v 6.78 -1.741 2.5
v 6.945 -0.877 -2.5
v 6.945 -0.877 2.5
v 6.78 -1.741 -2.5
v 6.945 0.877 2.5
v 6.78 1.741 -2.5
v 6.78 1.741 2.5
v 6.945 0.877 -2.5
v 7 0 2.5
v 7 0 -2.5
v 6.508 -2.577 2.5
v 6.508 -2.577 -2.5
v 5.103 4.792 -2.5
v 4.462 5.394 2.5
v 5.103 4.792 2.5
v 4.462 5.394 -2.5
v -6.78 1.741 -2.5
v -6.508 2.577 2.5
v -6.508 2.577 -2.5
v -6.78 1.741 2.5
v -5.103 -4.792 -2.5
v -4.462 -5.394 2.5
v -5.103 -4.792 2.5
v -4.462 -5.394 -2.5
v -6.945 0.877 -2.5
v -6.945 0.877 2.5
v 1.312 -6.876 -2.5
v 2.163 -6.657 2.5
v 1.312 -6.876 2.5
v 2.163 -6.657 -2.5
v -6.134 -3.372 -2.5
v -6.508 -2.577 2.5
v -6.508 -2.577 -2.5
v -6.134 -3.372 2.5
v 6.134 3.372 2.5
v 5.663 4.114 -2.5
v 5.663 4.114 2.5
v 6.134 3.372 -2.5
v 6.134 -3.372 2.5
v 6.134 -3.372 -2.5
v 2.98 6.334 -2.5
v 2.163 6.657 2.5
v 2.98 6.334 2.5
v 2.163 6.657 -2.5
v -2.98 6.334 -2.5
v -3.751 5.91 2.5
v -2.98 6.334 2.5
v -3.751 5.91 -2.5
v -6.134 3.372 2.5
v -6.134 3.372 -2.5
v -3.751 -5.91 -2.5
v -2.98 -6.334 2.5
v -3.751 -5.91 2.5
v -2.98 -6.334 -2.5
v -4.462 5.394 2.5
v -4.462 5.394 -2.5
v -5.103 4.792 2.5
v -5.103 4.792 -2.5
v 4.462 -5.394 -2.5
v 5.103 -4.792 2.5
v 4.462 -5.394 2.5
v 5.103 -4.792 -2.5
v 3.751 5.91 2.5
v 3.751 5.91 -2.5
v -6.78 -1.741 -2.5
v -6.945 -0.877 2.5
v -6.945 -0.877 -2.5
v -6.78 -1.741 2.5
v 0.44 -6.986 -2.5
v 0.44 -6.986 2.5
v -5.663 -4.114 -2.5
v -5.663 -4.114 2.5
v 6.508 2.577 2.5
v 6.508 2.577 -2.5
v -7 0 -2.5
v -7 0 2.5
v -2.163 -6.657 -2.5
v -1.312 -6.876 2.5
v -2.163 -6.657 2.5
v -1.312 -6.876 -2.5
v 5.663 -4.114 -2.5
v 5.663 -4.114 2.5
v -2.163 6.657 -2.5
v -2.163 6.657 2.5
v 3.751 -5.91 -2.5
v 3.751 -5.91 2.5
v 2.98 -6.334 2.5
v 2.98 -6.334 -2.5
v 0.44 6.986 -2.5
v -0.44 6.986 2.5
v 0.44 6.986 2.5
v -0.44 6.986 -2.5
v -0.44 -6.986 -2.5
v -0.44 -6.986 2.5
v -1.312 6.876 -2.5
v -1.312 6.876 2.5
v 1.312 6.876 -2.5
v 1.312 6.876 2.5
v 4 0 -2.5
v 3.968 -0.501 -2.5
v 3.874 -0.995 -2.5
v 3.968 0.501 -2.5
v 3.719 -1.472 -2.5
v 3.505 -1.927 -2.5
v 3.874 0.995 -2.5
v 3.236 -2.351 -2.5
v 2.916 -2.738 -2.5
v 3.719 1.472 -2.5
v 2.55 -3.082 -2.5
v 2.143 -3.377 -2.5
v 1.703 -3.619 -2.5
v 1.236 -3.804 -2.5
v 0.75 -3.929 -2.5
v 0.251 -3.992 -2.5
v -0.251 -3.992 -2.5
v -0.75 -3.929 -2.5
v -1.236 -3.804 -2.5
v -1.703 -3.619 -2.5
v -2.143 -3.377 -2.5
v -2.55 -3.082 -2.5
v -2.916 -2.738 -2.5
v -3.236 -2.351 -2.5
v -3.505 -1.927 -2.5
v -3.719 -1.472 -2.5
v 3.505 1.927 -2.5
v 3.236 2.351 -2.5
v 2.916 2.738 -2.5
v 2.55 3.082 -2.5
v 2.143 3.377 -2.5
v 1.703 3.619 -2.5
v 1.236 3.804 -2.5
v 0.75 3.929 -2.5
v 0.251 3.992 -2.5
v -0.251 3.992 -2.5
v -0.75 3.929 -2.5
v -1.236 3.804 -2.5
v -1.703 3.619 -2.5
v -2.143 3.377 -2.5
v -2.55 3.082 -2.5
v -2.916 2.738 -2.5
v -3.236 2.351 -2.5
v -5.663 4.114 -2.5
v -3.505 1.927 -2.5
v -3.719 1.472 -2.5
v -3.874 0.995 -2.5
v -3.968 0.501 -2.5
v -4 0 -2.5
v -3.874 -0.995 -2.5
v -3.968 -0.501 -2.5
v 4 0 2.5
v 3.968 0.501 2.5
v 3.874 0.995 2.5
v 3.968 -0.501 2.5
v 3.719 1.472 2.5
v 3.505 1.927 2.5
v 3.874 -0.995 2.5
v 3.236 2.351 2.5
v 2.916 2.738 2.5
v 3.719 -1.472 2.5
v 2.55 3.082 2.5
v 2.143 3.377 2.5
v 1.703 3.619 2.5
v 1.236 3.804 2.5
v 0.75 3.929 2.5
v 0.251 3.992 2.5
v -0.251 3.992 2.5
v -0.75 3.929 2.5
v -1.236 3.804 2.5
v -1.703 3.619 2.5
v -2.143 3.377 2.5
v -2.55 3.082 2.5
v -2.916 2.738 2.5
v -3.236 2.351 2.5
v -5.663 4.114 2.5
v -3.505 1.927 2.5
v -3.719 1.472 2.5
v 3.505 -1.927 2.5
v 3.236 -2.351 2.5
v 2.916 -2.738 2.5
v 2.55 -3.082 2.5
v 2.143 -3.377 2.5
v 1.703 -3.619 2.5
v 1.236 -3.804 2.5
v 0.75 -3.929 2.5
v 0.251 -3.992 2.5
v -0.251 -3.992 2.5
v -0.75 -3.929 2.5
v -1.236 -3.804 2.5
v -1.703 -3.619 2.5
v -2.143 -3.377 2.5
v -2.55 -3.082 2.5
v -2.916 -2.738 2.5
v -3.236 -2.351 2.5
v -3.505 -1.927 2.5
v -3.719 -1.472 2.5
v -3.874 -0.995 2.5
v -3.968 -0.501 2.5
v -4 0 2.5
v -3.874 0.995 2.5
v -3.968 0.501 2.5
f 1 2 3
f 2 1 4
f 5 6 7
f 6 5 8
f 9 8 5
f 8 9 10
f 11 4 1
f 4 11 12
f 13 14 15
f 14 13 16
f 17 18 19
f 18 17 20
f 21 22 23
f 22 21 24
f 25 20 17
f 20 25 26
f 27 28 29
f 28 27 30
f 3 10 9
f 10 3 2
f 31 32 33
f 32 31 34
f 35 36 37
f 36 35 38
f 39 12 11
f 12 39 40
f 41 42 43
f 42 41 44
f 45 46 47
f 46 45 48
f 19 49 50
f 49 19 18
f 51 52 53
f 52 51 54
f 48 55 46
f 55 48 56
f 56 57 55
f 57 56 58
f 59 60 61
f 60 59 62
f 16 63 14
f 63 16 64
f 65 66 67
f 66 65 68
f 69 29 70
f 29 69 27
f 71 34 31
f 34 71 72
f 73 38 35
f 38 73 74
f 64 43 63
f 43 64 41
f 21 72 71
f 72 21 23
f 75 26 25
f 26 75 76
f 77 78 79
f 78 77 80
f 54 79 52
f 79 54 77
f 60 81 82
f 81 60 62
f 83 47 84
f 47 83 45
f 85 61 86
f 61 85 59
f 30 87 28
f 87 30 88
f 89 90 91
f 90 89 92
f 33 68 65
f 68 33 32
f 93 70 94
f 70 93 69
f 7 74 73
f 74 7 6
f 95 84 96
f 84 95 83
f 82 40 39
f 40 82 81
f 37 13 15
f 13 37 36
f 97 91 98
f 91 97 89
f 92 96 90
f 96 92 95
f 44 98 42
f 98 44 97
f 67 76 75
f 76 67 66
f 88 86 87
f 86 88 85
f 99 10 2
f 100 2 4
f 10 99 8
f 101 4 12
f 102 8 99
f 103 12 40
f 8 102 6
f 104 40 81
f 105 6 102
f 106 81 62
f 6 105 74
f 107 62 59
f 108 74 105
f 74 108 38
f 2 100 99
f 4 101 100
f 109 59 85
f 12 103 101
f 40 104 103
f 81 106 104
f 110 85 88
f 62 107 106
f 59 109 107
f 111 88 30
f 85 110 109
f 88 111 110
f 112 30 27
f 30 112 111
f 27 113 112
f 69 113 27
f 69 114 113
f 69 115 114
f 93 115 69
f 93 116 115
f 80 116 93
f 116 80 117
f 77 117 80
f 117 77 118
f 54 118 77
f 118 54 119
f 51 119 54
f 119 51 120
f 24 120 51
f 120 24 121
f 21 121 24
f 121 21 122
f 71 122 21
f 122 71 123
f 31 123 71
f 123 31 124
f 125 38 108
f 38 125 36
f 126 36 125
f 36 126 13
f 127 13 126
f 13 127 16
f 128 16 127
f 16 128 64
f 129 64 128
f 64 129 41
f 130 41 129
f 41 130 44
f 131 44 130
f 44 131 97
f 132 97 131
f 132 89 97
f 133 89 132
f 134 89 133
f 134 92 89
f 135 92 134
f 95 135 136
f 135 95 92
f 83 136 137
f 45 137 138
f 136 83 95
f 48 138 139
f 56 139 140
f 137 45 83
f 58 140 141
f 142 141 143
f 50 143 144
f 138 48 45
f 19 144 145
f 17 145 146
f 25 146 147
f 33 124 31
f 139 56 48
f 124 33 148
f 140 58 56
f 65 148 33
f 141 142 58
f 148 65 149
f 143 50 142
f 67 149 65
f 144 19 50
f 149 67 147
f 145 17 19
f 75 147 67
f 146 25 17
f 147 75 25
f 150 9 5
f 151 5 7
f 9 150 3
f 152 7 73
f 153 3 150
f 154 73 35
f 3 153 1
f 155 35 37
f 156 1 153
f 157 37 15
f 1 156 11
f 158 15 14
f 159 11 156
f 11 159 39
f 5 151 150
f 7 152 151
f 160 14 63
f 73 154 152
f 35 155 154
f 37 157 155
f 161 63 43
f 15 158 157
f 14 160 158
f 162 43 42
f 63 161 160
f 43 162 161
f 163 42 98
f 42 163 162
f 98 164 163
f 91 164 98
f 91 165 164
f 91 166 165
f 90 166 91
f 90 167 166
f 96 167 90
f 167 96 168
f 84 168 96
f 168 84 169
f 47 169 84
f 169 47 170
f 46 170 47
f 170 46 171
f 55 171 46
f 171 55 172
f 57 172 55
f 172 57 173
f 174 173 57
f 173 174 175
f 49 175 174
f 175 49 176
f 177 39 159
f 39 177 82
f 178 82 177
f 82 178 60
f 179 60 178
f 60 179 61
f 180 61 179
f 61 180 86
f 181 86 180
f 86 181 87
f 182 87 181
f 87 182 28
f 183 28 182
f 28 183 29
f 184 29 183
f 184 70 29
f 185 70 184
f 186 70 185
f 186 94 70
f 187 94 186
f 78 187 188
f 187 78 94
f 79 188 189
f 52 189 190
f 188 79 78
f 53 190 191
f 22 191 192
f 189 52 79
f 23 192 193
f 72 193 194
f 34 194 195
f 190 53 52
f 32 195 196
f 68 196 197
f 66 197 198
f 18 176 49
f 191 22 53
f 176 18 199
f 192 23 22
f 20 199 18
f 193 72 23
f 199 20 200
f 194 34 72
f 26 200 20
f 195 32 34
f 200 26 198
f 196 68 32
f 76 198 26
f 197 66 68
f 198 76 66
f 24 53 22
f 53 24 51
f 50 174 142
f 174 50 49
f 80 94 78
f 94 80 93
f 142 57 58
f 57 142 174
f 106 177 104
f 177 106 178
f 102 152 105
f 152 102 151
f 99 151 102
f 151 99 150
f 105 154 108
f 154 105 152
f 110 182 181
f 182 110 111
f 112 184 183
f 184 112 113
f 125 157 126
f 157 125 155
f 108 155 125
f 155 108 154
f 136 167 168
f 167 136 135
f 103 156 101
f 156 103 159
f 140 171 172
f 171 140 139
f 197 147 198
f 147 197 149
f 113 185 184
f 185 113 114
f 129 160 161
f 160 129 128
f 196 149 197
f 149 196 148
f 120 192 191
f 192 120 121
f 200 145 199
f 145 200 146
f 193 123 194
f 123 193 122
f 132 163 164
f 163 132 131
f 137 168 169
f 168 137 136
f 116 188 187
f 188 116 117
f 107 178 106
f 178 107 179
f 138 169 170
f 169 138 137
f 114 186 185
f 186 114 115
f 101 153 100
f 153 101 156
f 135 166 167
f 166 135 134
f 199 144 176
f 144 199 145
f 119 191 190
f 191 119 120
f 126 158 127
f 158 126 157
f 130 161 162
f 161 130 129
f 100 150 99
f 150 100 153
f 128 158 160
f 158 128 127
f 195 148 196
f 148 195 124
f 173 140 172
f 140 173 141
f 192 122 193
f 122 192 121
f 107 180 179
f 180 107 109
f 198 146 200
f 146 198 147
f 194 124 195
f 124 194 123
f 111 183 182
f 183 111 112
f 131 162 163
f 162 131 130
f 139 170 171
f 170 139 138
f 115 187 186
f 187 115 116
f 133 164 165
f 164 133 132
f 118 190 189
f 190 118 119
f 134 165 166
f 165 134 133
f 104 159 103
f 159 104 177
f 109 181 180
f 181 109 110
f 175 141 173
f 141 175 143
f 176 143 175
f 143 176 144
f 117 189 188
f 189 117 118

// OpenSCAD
$fn = 50;


difference() {
	union() {
		translate(v = [0, 0, -2.5000000000]) {
			cylinder(h = 5, r = 7.0000000000);
		}
	}
	union() {
		translate(v = [0, 0, -100.0000000000]) {
			cylinder(h = 200, r = 4.0000000000);
		}
	}
}
